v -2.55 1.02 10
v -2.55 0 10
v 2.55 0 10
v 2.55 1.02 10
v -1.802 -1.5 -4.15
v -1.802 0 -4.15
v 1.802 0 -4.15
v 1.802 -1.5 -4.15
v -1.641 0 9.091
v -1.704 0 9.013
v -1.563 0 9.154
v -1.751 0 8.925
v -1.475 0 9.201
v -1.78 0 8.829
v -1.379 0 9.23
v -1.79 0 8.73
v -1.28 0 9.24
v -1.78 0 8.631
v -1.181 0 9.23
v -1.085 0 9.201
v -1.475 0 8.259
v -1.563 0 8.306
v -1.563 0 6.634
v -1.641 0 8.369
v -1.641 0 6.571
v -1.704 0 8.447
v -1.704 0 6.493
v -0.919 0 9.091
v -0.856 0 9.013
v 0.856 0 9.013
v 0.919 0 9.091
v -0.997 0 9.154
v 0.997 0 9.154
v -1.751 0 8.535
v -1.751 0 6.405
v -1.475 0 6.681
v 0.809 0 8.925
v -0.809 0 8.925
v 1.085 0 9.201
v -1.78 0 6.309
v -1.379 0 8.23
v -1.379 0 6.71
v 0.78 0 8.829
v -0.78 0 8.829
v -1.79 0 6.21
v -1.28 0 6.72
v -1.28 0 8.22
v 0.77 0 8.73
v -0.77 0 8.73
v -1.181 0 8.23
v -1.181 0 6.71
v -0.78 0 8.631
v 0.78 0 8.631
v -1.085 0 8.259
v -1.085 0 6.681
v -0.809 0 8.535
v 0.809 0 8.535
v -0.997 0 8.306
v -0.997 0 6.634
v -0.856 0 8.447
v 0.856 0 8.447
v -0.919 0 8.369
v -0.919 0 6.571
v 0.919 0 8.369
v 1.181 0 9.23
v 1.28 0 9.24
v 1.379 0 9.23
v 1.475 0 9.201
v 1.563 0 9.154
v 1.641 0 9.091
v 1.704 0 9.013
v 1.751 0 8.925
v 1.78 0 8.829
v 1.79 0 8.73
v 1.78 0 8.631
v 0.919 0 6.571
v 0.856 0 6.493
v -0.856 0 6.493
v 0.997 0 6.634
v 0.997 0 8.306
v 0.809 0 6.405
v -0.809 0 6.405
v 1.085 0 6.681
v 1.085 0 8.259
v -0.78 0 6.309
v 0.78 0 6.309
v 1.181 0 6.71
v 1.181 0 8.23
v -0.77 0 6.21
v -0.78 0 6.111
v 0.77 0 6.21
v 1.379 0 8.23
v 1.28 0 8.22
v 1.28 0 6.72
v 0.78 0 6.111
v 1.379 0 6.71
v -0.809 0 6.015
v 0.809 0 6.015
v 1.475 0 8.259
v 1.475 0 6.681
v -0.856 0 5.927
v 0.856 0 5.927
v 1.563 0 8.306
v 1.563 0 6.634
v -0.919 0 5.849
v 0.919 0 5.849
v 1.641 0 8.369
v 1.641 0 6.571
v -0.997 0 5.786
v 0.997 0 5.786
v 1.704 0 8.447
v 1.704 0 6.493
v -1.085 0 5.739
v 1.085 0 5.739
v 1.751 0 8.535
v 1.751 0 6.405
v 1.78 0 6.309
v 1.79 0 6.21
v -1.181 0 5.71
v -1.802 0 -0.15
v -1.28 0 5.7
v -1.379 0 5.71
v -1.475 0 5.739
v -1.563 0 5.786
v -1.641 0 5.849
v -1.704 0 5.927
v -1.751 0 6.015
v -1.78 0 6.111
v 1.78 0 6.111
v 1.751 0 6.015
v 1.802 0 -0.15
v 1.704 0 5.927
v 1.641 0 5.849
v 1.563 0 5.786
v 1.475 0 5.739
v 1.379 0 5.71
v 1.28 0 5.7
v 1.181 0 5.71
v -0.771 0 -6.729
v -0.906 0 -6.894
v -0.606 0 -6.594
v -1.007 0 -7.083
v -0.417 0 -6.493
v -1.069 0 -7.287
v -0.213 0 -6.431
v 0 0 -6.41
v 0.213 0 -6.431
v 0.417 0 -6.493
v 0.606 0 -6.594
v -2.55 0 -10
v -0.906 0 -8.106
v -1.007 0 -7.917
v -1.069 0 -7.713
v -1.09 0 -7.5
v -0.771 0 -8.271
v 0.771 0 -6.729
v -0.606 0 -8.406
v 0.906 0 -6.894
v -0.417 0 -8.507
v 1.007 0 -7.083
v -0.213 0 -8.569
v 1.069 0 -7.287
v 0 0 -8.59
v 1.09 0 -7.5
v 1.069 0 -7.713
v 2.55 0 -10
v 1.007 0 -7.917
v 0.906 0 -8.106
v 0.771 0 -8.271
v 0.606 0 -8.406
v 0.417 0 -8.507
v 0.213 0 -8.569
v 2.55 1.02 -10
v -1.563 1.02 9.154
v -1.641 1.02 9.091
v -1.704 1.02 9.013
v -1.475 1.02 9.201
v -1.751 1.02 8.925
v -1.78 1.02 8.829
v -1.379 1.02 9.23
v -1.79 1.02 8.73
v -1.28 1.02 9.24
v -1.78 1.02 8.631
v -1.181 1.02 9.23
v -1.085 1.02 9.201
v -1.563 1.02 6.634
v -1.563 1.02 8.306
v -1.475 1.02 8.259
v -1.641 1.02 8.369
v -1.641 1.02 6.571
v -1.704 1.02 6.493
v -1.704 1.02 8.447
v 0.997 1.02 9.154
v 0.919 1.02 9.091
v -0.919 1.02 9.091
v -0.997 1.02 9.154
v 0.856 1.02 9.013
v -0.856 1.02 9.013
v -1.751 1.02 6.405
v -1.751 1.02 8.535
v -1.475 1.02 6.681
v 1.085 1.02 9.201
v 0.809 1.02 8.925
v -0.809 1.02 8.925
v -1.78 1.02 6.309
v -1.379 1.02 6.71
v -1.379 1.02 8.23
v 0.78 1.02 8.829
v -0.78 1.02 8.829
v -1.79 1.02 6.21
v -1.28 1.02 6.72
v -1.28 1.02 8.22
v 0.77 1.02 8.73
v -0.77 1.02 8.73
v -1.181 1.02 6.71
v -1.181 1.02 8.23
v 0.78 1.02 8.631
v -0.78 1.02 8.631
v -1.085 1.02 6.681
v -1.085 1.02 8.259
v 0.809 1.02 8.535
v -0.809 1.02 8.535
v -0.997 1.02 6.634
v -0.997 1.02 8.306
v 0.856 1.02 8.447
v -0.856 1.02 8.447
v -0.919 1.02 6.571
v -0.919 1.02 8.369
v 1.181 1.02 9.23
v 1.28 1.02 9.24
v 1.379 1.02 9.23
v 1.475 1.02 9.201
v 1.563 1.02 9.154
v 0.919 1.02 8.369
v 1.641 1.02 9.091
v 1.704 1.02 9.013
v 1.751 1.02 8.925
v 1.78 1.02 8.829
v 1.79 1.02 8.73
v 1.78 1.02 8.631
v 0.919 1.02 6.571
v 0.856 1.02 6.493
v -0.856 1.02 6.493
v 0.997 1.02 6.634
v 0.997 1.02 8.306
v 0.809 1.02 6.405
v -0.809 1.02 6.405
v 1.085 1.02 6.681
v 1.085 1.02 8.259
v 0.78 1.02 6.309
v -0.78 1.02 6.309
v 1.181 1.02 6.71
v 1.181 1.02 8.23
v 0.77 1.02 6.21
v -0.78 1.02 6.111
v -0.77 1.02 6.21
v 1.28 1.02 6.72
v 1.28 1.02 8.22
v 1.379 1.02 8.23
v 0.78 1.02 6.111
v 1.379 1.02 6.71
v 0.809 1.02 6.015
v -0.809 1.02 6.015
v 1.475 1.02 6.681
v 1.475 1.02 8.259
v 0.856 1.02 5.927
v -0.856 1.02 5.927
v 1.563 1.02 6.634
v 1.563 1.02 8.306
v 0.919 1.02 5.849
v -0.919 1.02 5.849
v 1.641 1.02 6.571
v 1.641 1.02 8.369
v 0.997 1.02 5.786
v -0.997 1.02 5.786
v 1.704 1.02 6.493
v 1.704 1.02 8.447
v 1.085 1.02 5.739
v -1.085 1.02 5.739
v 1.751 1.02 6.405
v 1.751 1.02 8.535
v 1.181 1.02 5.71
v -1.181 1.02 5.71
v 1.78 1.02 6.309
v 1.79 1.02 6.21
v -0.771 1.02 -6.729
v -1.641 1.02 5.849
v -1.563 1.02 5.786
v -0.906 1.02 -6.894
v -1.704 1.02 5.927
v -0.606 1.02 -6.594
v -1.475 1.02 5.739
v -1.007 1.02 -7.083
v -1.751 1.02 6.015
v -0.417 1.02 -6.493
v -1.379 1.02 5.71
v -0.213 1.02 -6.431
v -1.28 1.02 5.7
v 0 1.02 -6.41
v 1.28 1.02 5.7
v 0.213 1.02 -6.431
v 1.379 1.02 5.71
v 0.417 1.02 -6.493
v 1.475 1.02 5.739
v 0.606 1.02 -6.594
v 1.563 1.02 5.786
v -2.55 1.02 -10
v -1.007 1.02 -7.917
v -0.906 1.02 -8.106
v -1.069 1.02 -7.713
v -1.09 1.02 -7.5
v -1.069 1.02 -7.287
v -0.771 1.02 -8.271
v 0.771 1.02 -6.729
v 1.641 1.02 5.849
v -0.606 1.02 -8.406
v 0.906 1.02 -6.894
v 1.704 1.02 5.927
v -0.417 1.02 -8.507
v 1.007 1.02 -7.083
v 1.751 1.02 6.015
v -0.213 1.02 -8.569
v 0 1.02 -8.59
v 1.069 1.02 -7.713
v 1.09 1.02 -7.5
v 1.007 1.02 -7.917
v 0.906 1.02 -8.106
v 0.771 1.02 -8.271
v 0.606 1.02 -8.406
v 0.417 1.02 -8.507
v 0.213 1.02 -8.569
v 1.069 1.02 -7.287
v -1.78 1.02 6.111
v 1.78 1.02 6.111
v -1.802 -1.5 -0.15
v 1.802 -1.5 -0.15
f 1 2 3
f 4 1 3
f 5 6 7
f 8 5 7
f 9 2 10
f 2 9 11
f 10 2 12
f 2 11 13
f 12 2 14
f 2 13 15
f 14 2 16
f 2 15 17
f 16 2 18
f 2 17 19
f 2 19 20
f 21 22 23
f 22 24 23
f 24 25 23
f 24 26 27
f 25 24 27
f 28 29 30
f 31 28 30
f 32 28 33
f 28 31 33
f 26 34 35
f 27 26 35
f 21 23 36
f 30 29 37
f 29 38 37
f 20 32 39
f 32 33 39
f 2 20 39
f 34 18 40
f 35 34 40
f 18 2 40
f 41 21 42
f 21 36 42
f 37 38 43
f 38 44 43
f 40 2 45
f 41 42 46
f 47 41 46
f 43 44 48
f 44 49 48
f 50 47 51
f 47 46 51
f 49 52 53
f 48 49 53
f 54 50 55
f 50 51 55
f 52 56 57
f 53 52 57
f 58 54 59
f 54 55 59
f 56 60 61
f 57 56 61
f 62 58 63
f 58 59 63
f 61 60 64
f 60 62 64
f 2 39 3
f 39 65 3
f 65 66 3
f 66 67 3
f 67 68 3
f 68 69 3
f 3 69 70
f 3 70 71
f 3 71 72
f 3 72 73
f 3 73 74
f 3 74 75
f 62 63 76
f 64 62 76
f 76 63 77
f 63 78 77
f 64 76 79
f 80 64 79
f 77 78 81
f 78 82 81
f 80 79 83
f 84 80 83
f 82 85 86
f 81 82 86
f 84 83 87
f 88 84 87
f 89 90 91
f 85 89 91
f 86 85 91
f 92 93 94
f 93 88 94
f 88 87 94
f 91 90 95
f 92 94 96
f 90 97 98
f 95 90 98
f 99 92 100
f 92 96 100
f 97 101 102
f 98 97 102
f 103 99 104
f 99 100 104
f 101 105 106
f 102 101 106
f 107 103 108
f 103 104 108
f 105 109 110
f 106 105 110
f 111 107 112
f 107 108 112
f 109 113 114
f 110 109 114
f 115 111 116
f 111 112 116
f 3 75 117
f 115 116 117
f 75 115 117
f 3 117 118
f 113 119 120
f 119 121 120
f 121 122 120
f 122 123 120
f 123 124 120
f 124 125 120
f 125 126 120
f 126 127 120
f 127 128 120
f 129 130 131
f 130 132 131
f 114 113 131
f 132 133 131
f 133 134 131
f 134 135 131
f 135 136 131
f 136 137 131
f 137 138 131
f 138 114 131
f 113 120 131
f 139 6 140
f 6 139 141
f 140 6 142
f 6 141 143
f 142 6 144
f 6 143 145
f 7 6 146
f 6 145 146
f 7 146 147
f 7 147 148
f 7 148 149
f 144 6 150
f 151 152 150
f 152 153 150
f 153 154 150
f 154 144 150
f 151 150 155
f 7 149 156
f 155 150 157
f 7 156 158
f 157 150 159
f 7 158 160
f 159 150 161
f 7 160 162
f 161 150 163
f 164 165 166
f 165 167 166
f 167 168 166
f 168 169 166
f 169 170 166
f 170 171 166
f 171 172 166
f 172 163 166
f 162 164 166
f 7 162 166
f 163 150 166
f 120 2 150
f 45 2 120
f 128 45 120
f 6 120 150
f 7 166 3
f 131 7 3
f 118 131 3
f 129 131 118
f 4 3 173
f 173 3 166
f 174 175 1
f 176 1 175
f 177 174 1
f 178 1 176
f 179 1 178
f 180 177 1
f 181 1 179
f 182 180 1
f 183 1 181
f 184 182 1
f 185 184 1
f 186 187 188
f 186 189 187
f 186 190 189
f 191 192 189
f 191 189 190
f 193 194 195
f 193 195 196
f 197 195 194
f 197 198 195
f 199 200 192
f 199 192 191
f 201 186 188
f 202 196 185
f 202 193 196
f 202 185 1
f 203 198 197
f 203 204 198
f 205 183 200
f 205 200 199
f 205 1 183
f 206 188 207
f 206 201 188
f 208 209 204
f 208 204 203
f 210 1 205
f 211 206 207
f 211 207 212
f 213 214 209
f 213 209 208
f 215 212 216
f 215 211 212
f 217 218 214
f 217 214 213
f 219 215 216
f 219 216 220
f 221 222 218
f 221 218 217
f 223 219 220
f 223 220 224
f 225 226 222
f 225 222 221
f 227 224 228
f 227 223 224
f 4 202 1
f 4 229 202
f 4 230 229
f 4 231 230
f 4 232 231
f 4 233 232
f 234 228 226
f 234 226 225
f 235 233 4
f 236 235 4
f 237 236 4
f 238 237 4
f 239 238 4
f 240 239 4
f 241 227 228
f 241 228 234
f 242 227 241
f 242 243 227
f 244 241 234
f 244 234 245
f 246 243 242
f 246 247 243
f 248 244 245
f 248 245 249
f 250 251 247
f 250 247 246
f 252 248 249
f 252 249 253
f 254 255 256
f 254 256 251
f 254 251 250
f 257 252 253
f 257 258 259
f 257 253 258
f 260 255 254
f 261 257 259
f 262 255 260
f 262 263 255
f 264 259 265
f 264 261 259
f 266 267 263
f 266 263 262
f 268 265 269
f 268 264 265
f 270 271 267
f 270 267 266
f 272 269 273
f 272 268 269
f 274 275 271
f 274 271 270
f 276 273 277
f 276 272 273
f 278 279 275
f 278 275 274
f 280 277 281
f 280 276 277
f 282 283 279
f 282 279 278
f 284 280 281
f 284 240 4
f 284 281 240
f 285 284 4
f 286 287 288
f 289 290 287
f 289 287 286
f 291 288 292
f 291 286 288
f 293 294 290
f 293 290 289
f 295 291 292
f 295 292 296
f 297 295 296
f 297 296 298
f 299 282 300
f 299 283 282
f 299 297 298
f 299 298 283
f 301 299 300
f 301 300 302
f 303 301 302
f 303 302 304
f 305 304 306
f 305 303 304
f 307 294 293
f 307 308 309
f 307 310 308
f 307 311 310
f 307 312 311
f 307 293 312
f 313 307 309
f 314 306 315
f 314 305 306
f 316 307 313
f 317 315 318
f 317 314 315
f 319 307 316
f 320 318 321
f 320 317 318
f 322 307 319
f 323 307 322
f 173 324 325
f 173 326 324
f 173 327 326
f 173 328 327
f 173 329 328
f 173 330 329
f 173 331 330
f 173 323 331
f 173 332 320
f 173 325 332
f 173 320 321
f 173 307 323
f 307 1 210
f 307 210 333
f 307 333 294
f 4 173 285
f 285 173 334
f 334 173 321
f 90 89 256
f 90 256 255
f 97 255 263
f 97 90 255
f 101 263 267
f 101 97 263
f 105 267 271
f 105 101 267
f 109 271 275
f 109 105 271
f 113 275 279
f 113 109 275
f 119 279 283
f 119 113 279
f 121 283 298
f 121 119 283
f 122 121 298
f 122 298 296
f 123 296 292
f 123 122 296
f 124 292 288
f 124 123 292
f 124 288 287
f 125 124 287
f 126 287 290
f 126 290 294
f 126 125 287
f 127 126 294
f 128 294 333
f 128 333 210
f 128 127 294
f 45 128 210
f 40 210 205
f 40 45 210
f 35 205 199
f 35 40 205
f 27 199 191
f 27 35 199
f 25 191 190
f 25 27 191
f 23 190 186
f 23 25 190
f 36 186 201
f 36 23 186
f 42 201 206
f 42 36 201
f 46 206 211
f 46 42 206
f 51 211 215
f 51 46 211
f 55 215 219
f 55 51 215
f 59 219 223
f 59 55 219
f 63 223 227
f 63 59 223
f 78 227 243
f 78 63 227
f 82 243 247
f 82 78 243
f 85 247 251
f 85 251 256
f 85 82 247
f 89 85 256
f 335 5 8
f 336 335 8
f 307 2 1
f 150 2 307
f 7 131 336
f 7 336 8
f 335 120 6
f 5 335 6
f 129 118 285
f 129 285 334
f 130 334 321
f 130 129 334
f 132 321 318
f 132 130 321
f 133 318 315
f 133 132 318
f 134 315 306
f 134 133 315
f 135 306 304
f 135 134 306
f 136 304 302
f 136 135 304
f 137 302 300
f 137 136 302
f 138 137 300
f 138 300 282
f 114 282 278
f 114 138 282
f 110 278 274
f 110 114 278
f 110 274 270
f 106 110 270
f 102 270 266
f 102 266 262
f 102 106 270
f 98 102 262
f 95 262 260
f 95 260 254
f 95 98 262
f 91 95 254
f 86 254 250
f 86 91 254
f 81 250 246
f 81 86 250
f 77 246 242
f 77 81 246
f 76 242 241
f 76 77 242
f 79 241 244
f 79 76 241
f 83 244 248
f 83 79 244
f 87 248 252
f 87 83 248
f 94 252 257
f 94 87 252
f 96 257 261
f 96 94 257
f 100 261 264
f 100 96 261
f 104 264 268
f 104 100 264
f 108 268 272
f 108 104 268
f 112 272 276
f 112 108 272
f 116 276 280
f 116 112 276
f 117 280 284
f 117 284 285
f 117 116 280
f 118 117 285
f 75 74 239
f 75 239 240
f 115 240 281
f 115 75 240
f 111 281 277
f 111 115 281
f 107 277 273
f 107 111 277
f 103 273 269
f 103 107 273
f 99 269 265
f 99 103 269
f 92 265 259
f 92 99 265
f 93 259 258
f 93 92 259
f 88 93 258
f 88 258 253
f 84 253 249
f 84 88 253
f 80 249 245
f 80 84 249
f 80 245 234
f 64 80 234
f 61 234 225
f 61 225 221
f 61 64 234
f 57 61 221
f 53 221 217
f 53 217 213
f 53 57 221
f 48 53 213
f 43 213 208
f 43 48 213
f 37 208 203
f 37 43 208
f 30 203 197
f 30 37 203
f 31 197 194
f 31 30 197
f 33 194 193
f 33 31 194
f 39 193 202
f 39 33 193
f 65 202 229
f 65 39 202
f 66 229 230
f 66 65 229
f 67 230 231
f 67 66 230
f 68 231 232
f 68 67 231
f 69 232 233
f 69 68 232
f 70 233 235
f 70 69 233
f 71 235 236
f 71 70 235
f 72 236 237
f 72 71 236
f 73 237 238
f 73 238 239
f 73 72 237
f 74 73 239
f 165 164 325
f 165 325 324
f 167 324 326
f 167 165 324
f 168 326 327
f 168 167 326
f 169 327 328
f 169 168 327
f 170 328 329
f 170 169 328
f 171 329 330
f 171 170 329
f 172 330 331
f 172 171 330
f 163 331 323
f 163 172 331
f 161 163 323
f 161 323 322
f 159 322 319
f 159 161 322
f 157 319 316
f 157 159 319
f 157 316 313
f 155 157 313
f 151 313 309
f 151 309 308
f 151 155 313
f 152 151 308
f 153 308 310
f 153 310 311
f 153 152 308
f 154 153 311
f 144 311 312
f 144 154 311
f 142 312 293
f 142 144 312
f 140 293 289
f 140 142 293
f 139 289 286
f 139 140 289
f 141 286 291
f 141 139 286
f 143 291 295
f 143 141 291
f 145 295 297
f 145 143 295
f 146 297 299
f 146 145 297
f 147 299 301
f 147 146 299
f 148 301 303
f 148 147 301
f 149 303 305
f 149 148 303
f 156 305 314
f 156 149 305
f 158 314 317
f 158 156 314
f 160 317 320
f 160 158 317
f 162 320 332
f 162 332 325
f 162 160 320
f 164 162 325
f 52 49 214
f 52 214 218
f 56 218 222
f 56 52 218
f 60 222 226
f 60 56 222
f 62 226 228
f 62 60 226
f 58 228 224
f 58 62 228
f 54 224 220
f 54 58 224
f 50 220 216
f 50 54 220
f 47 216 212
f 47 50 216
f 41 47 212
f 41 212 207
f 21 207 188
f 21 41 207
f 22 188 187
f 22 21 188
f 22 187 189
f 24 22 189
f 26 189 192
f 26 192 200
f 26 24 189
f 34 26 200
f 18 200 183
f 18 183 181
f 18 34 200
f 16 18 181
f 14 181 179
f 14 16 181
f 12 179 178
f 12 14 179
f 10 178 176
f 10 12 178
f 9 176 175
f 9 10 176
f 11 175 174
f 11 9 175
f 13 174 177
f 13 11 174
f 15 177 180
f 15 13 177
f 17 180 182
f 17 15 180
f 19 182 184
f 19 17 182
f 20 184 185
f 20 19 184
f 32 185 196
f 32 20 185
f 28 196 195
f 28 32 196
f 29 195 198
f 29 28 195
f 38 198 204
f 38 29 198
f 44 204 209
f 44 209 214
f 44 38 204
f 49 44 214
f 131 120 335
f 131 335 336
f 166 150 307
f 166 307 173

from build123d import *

# Parameters (mm, degrees)
SKETCH1_W    = 5.1
SKETCH1_H    = 20
SKETCH1_R    = 1.09
SKETCH1_R_2  = 0.51
SKETCH1_W_2  = 3.604970558
SKETCH1_H_2  = 4
BODY_DEPTH   = 1.02
SKETCH3_W    = 3.604970558
SKETCH3_H    = 4
SENSOR_DEPTH = 2.52


with BuildPart() as part:
    # Sketch1 → Body (new body)
    with BuildSketch(Plane(origin=(0, 0, 0), x_dir=(1, 0, 0), z_dir=(0, 1, 0))):
        Rectangle(SKETCH1_W, SKETCH1_H)
        with Locations((0, 7.5)):
            Circle(SKETCH1_R, mode=Mode.SUBTRACT)
        with Locations((-1.28, -6.21)):
            Circle(SKETCH1_R_2, mode=Mode.SUBTRACT)
        with Locations((-1.28, -8.73)):
            Circle(SKETCH1_R_2, mode=Mode.SUBTRACT)
        with Locations((1.28, -6.21)):
            Circle(SKETCH1_R_2, mode=Mode.SUBTRACT)
        with Locations((1.28, -8.73)):
            Circle(SKETCH1_R_2, mode=Mode.SUBTRACT)
        with Locations((0, 2.15)):
            Rectangle(SKETCH1_W_2, SKETCH1_H_2, mode=Mode.SUBTRACT)
    extrude(amount=BODY_DEPTH)

    # Sketch3 → Sensor (add)
    with BuildSketch(Plane(origin=(0, 1.02, 0), x_dir=(1, 0, 0), z_dir=(0, 1, 0))):
        with Locations((0, 2.15)):
            Rectangle(SKETCH3_W, SKETCH3_H)
    extrude(amount=-SENSOR_DEPTH)


solid = part.part
